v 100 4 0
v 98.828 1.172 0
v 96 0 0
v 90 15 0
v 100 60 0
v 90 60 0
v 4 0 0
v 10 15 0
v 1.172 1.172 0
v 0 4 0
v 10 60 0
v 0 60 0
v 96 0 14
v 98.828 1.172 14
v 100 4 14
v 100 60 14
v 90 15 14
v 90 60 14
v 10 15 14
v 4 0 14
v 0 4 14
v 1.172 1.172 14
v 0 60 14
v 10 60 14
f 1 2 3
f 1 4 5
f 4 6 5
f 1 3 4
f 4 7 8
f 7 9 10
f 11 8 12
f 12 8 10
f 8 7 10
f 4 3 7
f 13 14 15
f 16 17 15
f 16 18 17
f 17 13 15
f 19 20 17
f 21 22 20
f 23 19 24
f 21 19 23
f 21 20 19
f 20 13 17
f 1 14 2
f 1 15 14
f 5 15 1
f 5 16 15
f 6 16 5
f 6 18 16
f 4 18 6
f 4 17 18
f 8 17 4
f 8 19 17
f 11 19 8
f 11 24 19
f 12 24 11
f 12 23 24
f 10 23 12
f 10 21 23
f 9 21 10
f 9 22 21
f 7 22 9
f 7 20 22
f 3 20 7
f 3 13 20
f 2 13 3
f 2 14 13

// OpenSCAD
$fn = 32;

// ----------------------------------------------------------------------
// Heat sink frame: 100 x 60 mm frame, 10 mm walls
// ----------------------------------------------------------------------

// --- parameters (mm) ---
profile_height = 14;      // extrusion height
profile_points = 12;      // points of the closed outline

profile = [[0, 4], [1.172, 1.172], [4, 0], [96, 0], [98.828, 1.172], [100, 4], [100, 60], [90, 60], [90, 15], [10, 15], [10, 60], [0, 60]];  // single closed polygon, 12 points, counter clockwise

// --- the one profile operation ---
linear_extrude(height = profile_height) polygon(points = profile);
